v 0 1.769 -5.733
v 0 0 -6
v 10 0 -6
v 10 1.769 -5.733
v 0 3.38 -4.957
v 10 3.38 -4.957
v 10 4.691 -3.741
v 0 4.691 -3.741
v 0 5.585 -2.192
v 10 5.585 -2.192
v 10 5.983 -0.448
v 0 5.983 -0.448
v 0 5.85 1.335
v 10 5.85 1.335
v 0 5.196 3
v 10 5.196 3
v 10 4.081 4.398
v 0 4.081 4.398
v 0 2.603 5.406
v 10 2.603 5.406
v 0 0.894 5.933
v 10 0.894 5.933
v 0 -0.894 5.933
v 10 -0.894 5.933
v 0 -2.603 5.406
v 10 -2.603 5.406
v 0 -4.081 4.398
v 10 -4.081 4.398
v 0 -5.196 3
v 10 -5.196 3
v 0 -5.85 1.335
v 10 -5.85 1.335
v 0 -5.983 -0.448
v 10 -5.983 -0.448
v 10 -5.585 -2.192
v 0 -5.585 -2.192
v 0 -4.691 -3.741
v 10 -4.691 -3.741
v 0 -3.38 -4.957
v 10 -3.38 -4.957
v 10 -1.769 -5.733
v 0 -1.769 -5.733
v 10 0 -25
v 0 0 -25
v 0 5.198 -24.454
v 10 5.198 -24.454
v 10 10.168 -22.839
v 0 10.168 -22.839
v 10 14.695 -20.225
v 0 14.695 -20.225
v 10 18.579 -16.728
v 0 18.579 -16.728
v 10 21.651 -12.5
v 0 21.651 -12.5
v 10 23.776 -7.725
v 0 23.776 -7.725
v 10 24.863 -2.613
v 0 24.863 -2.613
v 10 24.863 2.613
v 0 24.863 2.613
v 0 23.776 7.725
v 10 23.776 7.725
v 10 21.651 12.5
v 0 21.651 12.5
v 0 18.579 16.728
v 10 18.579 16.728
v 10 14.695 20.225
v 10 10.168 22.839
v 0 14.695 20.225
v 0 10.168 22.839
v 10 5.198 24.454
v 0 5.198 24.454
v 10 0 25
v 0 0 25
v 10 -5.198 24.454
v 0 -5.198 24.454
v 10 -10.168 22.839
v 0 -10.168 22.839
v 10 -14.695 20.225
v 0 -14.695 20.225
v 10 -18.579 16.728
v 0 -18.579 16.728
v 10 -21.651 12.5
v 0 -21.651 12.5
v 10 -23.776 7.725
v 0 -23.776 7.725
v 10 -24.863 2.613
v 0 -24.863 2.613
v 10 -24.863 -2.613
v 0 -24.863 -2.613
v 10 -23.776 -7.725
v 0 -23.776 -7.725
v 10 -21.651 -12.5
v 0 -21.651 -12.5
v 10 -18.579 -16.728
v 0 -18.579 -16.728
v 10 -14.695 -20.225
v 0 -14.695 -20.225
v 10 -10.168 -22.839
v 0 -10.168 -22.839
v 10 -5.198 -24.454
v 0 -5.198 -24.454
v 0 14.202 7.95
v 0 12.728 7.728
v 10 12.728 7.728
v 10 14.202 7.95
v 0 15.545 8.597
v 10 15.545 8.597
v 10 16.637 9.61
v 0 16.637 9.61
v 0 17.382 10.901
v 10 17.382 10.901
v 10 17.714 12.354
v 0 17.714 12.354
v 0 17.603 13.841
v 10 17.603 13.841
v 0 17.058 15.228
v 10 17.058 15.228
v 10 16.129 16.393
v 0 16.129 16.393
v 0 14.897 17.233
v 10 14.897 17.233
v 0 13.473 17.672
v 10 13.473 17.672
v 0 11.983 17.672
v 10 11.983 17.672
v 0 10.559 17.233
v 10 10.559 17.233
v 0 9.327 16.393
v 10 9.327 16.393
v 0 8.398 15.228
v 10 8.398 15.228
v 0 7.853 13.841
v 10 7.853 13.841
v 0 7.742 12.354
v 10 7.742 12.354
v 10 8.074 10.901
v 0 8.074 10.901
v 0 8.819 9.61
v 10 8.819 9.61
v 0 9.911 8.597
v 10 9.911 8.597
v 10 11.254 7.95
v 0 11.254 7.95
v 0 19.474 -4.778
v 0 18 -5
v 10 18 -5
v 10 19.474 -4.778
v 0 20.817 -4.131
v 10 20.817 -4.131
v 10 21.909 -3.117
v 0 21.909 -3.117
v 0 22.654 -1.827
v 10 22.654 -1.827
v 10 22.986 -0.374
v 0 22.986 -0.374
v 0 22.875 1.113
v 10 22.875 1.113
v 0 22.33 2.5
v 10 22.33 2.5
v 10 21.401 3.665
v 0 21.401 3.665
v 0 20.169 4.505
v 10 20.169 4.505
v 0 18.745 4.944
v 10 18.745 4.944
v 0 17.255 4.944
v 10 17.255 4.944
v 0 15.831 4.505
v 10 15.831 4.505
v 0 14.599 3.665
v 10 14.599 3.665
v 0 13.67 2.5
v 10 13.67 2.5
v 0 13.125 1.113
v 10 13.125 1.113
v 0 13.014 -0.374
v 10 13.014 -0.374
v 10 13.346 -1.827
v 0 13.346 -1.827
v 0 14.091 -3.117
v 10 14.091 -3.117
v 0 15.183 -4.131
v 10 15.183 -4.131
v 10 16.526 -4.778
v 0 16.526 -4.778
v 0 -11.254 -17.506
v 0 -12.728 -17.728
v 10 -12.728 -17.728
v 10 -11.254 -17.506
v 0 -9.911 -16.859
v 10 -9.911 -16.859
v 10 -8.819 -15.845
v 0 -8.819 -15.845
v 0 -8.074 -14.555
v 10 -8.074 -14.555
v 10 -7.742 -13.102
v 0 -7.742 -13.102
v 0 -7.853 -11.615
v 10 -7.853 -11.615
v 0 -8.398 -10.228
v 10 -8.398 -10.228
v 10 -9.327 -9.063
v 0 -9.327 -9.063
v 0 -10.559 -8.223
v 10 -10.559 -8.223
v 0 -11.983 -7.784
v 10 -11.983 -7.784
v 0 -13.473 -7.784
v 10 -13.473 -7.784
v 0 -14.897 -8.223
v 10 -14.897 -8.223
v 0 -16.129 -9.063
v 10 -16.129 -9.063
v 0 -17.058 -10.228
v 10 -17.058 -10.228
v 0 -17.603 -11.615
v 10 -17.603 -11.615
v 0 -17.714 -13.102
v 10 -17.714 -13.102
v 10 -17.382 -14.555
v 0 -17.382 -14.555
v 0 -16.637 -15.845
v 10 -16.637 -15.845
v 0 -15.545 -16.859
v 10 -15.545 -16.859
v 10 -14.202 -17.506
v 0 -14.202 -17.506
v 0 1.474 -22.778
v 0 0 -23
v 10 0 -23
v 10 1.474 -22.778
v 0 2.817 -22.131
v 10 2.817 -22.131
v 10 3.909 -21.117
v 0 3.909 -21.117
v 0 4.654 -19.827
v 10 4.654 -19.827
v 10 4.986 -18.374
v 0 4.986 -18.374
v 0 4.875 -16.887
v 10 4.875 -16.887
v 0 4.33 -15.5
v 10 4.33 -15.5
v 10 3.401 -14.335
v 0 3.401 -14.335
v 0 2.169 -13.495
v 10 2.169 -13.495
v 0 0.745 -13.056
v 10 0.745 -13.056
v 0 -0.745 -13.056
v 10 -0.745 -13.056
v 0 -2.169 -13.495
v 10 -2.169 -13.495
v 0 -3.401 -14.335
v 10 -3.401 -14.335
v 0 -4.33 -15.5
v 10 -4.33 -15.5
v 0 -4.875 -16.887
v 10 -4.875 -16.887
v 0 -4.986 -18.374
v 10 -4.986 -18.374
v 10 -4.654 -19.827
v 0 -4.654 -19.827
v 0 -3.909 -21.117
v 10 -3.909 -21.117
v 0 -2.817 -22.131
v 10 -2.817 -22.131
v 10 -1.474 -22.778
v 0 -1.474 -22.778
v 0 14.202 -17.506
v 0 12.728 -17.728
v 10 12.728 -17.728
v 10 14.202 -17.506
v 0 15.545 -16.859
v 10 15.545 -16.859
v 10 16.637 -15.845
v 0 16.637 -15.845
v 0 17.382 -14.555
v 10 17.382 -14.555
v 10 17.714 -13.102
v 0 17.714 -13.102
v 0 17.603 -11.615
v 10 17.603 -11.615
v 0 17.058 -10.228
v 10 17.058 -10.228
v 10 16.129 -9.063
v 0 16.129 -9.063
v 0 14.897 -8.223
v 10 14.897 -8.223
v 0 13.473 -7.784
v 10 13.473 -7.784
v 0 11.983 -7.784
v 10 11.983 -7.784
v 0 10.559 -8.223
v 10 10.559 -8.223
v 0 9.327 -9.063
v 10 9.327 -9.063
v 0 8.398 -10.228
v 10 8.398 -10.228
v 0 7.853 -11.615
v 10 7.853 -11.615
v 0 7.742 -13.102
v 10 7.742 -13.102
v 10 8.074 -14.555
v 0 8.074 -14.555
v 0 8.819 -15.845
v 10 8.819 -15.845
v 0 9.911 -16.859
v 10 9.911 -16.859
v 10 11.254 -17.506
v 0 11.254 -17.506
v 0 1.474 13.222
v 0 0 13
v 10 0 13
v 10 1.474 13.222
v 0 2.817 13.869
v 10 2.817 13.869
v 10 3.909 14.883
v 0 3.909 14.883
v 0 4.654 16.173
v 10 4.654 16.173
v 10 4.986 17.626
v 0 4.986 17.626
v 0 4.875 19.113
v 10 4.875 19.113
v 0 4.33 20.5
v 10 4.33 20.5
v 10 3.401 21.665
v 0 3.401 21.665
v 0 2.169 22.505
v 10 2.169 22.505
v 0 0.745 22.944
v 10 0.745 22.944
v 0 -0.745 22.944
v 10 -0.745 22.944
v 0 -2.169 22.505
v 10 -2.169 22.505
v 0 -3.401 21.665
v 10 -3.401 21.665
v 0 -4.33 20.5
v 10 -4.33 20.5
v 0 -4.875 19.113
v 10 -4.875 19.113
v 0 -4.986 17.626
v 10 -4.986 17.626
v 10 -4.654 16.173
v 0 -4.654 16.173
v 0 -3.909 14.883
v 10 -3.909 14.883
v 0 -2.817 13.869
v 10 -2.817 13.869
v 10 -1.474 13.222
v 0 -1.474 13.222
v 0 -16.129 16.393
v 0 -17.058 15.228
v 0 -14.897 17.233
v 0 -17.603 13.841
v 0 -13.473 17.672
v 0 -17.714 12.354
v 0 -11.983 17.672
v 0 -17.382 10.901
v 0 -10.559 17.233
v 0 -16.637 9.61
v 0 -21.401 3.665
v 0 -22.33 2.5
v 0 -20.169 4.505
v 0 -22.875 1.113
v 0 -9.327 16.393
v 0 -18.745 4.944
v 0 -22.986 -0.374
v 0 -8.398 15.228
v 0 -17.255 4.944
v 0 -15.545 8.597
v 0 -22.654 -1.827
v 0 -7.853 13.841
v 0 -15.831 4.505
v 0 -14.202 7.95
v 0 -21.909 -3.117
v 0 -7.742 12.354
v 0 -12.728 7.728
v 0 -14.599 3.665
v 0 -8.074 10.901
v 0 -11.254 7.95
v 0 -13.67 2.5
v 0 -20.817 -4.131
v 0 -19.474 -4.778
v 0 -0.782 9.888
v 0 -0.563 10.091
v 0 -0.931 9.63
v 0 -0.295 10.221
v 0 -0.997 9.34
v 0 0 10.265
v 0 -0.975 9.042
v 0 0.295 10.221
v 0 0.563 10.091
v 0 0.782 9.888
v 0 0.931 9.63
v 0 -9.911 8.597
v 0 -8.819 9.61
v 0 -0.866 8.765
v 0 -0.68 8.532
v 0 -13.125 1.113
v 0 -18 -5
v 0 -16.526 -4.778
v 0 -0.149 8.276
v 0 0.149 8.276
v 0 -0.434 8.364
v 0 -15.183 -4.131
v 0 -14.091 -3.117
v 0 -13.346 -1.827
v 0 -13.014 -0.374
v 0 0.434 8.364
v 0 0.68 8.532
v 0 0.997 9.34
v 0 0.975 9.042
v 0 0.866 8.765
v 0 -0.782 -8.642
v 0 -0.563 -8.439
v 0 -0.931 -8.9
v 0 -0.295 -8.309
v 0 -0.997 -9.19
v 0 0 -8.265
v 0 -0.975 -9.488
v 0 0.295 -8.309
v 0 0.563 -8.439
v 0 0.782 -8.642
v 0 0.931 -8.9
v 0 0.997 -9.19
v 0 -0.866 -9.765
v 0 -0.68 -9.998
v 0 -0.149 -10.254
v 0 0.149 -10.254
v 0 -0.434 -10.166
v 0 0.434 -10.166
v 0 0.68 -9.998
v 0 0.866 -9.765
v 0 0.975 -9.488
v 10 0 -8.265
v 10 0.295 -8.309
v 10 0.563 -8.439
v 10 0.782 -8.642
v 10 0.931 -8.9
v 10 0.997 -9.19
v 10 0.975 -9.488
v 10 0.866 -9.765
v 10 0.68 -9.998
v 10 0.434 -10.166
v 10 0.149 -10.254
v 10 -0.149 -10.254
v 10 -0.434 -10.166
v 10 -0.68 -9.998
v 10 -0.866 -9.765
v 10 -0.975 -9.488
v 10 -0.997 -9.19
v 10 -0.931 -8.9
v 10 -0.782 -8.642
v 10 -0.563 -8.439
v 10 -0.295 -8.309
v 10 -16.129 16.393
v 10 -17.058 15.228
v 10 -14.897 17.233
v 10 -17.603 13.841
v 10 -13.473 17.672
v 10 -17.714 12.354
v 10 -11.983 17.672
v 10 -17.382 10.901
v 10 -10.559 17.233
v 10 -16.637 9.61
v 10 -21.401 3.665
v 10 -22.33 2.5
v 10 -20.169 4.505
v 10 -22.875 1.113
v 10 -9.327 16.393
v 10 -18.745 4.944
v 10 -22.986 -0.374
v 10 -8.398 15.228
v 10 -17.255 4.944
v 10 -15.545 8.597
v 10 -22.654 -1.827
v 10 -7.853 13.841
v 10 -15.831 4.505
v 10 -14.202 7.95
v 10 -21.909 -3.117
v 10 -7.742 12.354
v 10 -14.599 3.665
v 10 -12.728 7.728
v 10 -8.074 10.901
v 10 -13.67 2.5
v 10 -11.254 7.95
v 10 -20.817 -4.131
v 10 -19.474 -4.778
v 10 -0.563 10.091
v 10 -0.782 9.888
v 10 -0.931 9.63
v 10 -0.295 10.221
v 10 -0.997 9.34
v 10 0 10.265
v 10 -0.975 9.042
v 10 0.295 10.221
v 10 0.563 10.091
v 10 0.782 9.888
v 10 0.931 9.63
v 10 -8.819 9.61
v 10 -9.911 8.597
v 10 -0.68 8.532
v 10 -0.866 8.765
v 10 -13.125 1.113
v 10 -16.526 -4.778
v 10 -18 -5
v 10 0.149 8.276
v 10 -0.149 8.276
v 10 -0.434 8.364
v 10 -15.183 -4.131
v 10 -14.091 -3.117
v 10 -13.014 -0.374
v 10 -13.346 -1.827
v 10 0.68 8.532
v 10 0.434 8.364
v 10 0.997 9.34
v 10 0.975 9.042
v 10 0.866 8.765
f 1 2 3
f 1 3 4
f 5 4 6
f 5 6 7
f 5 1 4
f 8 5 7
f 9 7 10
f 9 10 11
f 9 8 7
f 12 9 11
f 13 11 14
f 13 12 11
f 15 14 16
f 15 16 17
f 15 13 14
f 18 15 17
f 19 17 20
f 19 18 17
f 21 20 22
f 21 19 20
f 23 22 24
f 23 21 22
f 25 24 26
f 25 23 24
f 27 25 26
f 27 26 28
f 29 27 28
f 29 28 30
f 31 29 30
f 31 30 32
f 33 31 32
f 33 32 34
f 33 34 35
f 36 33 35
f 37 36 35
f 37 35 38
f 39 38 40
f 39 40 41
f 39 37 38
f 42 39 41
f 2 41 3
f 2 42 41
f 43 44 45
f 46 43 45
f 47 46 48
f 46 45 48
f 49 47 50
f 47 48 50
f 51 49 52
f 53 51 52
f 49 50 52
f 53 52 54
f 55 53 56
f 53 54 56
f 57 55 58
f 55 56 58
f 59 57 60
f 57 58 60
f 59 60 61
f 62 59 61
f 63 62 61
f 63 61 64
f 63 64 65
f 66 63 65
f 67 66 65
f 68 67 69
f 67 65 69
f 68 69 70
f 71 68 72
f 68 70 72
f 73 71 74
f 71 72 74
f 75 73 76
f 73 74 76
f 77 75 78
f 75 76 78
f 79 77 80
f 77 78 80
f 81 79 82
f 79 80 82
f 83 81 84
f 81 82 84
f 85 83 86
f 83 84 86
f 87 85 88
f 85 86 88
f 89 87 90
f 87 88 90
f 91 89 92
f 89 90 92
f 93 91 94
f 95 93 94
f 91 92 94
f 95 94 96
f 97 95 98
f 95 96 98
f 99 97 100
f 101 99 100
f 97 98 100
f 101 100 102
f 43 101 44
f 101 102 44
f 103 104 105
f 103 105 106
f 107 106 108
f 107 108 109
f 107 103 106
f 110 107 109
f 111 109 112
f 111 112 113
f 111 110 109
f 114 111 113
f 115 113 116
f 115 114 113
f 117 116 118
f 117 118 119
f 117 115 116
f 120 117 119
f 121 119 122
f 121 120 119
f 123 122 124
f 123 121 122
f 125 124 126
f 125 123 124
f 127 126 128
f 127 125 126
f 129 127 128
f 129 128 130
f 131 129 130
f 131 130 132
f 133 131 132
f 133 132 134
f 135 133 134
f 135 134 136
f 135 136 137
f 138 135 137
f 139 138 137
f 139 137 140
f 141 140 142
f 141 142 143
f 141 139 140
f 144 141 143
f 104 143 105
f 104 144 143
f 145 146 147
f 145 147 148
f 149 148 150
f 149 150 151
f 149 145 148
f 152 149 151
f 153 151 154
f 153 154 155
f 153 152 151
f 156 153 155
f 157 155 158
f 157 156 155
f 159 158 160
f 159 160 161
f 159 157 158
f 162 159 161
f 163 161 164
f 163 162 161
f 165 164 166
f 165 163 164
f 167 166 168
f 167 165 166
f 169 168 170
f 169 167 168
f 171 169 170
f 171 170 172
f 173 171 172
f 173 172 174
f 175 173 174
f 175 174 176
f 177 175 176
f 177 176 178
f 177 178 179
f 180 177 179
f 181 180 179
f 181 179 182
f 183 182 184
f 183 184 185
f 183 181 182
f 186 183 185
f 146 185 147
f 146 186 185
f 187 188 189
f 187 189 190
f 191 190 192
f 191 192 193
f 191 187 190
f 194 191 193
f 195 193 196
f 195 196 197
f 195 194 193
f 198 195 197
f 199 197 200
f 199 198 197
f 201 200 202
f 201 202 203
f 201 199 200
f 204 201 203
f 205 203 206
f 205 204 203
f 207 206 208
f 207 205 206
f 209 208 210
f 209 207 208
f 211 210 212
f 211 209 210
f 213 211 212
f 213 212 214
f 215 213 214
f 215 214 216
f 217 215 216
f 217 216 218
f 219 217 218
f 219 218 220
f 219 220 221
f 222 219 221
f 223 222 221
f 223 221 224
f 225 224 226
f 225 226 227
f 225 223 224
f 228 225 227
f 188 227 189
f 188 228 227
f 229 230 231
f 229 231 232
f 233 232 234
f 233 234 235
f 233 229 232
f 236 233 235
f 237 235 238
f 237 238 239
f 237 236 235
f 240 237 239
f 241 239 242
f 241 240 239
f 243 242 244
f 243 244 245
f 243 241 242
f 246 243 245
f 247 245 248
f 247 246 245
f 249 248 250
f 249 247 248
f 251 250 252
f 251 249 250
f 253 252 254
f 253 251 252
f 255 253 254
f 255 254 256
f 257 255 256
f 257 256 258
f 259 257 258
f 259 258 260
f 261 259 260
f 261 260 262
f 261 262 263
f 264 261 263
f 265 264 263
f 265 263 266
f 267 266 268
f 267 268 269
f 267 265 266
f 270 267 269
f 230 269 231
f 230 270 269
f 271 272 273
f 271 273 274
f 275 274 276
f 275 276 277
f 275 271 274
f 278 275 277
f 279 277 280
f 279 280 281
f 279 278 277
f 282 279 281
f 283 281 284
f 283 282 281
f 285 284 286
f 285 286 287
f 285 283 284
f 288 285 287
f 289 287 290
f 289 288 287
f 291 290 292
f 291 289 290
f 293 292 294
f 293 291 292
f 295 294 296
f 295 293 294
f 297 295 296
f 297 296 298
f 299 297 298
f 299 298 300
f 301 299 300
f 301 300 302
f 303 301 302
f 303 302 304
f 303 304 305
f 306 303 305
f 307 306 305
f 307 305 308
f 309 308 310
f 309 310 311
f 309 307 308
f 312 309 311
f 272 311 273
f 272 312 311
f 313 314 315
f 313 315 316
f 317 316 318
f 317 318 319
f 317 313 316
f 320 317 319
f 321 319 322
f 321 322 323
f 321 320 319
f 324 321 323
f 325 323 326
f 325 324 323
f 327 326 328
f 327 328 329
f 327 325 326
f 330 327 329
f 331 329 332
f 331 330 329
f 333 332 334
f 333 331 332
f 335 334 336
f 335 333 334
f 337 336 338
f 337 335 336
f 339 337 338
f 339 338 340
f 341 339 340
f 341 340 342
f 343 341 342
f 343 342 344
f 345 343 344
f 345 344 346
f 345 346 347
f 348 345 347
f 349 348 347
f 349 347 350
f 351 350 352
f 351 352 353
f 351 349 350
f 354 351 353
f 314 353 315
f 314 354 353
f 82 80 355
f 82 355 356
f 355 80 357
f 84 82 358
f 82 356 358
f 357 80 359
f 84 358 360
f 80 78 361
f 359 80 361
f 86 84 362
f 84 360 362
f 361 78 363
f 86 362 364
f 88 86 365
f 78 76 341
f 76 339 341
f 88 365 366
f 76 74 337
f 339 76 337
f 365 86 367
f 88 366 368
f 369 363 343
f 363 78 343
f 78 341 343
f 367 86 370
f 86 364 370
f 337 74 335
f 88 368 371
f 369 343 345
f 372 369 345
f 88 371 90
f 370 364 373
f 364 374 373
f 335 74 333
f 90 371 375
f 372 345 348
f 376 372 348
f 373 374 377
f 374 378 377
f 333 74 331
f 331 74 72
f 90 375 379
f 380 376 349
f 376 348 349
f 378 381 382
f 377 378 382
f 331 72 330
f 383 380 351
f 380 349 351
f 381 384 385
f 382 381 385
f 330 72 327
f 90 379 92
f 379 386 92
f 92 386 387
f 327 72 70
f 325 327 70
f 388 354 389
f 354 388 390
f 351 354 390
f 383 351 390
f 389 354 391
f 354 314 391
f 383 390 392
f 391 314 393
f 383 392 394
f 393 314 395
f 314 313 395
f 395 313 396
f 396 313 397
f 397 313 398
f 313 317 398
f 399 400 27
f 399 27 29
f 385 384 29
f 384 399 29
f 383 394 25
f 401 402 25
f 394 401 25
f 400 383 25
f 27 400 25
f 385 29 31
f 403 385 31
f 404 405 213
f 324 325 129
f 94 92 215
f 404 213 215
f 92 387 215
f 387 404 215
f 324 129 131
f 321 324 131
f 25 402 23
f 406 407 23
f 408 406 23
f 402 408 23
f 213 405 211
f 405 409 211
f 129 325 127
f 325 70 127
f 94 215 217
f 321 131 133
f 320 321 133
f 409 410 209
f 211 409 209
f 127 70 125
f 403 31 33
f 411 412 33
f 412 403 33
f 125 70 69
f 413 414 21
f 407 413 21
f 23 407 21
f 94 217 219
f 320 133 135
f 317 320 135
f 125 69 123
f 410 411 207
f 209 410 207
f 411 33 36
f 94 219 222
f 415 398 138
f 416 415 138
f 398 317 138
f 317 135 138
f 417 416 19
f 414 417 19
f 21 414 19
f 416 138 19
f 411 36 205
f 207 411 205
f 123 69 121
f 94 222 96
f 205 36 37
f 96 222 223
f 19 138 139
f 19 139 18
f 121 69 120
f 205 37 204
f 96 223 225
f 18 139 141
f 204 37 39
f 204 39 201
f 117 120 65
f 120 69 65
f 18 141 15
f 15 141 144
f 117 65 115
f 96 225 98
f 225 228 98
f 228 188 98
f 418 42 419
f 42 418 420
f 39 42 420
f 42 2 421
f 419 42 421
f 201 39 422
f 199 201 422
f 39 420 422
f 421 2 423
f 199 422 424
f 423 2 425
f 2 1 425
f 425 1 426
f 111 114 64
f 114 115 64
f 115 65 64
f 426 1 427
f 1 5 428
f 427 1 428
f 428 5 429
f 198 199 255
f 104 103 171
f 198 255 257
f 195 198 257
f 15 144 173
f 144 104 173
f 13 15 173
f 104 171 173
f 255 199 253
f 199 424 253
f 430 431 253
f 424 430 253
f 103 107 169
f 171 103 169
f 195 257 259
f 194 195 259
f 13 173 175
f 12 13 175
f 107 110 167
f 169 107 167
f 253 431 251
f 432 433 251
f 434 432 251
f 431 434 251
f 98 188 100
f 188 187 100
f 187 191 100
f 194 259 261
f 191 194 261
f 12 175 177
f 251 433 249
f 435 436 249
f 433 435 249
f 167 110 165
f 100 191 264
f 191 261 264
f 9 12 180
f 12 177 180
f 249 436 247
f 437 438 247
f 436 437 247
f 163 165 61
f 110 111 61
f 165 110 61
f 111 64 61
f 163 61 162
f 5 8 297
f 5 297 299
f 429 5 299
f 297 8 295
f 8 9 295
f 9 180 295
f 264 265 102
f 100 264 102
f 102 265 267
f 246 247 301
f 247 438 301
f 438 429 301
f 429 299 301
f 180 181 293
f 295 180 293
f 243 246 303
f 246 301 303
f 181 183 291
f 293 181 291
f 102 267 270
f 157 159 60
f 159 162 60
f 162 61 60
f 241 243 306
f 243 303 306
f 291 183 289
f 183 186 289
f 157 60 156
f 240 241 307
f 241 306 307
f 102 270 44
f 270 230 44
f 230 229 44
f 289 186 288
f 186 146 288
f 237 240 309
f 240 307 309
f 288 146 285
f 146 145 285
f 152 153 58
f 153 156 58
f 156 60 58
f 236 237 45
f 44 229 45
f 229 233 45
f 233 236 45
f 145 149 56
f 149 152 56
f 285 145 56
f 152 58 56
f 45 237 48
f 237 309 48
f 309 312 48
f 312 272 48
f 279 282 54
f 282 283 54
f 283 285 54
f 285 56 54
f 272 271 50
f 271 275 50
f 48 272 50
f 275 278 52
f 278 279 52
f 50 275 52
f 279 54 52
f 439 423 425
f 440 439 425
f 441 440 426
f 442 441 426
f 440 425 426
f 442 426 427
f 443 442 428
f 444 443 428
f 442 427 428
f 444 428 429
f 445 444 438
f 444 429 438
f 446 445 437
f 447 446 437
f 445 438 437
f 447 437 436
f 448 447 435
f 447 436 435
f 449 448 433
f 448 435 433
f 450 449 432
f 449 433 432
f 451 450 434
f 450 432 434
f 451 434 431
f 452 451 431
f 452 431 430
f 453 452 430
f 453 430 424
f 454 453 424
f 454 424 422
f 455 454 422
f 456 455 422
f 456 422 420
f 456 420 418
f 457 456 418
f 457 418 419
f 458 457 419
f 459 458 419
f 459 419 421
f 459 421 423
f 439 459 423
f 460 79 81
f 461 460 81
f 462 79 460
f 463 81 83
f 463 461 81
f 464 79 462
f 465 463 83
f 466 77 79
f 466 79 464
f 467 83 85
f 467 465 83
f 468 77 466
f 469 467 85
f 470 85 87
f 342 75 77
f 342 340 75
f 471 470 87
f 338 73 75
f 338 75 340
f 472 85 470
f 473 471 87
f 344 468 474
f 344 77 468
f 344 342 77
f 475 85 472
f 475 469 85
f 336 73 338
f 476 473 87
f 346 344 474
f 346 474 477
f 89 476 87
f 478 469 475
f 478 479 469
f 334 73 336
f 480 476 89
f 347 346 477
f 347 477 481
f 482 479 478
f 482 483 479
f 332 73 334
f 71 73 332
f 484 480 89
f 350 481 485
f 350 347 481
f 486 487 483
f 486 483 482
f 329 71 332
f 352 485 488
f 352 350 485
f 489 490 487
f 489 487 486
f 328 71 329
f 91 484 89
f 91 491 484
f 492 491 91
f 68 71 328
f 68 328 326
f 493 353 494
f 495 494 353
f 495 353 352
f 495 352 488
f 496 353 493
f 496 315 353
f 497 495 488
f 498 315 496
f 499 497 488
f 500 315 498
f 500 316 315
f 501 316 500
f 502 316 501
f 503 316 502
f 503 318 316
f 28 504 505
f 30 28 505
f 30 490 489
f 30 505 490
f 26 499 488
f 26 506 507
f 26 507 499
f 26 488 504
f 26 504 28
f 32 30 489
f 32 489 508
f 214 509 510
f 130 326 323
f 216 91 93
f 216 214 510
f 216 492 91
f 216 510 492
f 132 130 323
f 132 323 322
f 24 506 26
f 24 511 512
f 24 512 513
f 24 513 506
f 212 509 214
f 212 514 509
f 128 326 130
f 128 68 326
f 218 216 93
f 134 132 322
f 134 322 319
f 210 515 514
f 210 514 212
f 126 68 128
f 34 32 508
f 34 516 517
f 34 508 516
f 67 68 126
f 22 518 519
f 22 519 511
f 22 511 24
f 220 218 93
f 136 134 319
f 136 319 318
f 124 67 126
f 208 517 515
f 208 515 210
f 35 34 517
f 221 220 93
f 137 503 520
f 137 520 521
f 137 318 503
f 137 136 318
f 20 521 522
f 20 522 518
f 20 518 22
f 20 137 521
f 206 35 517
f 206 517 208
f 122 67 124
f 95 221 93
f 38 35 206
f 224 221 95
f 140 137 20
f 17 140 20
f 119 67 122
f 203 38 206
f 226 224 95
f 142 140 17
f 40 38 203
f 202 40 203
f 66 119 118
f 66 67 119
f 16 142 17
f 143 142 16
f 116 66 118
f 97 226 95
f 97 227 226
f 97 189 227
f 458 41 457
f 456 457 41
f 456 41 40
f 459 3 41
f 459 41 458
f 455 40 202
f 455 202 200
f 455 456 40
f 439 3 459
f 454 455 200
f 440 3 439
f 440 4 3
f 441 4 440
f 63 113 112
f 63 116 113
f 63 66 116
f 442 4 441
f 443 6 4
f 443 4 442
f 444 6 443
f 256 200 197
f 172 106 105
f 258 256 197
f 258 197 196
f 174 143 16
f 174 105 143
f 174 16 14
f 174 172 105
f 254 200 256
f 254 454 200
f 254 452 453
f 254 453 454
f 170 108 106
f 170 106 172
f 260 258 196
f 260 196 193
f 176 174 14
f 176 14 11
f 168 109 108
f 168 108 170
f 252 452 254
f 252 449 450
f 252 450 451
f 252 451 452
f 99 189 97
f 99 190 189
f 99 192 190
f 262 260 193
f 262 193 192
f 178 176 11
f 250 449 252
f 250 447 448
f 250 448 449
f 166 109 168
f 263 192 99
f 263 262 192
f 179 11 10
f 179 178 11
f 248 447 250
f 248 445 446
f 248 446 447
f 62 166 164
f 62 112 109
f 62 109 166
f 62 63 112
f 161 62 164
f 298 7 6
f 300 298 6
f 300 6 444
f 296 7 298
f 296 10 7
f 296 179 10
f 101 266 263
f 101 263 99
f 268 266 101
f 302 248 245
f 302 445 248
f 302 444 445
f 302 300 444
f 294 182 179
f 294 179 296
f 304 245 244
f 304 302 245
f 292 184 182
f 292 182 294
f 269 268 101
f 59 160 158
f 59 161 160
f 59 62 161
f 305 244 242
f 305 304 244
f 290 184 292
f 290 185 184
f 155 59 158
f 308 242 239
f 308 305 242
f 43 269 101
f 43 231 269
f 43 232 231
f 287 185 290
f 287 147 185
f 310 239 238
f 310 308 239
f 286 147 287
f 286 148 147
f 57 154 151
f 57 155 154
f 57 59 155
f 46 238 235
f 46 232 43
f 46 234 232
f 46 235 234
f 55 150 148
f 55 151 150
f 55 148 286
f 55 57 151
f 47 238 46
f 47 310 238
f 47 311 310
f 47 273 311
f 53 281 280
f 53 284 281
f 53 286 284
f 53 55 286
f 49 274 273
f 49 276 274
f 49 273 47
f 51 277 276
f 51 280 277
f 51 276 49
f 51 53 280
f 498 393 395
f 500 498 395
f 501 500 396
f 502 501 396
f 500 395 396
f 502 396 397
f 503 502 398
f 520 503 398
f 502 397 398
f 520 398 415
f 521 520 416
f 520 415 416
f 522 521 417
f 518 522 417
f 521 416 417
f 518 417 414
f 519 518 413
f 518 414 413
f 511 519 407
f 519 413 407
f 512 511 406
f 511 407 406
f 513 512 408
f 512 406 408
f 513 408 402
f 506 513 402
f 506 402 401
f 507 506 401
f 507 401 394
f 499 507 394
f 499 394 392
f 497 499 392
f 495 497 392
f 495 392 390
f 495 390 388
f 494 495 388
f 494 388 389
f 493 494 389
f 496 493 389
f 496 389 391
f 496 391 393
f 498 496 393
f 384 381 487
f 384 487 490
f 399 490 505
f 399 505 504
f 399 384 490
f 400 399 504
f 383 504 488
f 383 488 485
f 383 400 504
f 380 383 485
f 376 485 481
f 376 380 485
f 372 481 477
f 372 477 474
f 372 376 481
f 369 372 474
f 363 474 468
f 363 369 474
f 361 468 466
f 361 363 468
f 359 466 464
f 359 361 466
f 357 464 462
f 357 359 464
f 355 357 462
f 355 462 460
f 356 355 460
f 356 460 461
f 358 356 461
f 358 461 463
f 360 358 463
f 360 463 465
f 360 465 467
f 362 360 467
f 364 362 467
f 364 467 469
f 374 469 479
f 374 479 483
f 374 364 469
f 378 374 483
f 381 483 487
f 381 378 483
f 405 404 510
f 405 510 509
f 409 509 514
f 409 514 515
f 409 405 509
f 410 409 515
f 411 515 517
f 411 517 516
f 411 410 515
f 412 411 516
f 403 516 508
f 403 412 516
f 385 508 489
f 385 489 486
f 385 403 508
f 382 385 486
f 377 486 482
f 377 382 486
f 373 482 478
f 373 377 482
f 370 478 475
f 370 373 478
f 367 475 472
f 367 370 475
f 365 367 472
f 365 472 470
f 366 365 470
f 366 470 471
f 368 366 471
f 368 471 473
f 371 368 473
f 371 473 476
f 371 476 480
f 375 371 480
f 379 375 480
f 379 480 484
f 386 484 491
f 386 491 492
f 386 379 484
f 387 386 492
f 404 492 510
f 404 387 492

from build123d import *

# Parameters (mm, degrees)
SKETCH1_R           = 25
SKETCH1_R_2         = 5
SKETCH1_R_3         = 6
BOSS_EXTRUDE1_DEPTH = 10
SKETCH2_R           = 1
CUT_EXTRUDE1_DEPTH  = 15


with BuildPart() as part:
    # Sketch1 → Boss-Extrude1 (new body)
    with BuildSketch(Plane(origin=(0, 0, 0), x_dir=(0, 0, -1), z_dir=(1, 0, 0))):
        Circle(SKETCH1_R)
        with Locations((0, 18)):
            Circle(SKETCH1_R_2, mode=Mode.SUBTRACT)
        with Locations((12.727922061, 12.727922061)):
            Circle(SKETCH1_R_2, mode=Mode.SUBTRACT)
        with Locations((18, 0)):
            Circle(SKETCH1_R_2, mode=Mode.SUBTRACT)
        with Locations((12.727922061, -12.727922061)):
            Circle(SKETCH1_R_2, mode=Mode.SUBTRACT)
        with Locations((0, -18)):
            Circle(SKETCH1_R_2, mode=Mode.SUBTRACT)
        with Locations((-12.727922061, -12.727922061)):
            Circle(SKETCH1_R_2, mode=Mode.SUBTRACT)
        with Locations((-18, 0)):
            Circle(SKETCH1_R_2, mode=Mode.SUBTRACT)
        with Locations((-12.727922061, 12.727922061)):
            Circle(SKETCH1_R_2, mode=Mode.SUBTRACT)
        Circle(SKETCH1_R_3, mode=Mode.SUBTRACT)
    extrude(amount=BOSS_EXTRUDE1_DEPTH)

    # Sketch2 → Cut-Extrude1 (cut)
    with BuildSketch(Plane.ZY):
        with Locations((-9.265, 0)):
            Circle(SKETCH2_R)
        with Locations((9.265, 0)):
            Circle(SKETCH2_R)
    extrude(amount=-CUT_EXTRUDE1_DEPTH, mode=Mode.SUBTRACT)


solid = part.part
